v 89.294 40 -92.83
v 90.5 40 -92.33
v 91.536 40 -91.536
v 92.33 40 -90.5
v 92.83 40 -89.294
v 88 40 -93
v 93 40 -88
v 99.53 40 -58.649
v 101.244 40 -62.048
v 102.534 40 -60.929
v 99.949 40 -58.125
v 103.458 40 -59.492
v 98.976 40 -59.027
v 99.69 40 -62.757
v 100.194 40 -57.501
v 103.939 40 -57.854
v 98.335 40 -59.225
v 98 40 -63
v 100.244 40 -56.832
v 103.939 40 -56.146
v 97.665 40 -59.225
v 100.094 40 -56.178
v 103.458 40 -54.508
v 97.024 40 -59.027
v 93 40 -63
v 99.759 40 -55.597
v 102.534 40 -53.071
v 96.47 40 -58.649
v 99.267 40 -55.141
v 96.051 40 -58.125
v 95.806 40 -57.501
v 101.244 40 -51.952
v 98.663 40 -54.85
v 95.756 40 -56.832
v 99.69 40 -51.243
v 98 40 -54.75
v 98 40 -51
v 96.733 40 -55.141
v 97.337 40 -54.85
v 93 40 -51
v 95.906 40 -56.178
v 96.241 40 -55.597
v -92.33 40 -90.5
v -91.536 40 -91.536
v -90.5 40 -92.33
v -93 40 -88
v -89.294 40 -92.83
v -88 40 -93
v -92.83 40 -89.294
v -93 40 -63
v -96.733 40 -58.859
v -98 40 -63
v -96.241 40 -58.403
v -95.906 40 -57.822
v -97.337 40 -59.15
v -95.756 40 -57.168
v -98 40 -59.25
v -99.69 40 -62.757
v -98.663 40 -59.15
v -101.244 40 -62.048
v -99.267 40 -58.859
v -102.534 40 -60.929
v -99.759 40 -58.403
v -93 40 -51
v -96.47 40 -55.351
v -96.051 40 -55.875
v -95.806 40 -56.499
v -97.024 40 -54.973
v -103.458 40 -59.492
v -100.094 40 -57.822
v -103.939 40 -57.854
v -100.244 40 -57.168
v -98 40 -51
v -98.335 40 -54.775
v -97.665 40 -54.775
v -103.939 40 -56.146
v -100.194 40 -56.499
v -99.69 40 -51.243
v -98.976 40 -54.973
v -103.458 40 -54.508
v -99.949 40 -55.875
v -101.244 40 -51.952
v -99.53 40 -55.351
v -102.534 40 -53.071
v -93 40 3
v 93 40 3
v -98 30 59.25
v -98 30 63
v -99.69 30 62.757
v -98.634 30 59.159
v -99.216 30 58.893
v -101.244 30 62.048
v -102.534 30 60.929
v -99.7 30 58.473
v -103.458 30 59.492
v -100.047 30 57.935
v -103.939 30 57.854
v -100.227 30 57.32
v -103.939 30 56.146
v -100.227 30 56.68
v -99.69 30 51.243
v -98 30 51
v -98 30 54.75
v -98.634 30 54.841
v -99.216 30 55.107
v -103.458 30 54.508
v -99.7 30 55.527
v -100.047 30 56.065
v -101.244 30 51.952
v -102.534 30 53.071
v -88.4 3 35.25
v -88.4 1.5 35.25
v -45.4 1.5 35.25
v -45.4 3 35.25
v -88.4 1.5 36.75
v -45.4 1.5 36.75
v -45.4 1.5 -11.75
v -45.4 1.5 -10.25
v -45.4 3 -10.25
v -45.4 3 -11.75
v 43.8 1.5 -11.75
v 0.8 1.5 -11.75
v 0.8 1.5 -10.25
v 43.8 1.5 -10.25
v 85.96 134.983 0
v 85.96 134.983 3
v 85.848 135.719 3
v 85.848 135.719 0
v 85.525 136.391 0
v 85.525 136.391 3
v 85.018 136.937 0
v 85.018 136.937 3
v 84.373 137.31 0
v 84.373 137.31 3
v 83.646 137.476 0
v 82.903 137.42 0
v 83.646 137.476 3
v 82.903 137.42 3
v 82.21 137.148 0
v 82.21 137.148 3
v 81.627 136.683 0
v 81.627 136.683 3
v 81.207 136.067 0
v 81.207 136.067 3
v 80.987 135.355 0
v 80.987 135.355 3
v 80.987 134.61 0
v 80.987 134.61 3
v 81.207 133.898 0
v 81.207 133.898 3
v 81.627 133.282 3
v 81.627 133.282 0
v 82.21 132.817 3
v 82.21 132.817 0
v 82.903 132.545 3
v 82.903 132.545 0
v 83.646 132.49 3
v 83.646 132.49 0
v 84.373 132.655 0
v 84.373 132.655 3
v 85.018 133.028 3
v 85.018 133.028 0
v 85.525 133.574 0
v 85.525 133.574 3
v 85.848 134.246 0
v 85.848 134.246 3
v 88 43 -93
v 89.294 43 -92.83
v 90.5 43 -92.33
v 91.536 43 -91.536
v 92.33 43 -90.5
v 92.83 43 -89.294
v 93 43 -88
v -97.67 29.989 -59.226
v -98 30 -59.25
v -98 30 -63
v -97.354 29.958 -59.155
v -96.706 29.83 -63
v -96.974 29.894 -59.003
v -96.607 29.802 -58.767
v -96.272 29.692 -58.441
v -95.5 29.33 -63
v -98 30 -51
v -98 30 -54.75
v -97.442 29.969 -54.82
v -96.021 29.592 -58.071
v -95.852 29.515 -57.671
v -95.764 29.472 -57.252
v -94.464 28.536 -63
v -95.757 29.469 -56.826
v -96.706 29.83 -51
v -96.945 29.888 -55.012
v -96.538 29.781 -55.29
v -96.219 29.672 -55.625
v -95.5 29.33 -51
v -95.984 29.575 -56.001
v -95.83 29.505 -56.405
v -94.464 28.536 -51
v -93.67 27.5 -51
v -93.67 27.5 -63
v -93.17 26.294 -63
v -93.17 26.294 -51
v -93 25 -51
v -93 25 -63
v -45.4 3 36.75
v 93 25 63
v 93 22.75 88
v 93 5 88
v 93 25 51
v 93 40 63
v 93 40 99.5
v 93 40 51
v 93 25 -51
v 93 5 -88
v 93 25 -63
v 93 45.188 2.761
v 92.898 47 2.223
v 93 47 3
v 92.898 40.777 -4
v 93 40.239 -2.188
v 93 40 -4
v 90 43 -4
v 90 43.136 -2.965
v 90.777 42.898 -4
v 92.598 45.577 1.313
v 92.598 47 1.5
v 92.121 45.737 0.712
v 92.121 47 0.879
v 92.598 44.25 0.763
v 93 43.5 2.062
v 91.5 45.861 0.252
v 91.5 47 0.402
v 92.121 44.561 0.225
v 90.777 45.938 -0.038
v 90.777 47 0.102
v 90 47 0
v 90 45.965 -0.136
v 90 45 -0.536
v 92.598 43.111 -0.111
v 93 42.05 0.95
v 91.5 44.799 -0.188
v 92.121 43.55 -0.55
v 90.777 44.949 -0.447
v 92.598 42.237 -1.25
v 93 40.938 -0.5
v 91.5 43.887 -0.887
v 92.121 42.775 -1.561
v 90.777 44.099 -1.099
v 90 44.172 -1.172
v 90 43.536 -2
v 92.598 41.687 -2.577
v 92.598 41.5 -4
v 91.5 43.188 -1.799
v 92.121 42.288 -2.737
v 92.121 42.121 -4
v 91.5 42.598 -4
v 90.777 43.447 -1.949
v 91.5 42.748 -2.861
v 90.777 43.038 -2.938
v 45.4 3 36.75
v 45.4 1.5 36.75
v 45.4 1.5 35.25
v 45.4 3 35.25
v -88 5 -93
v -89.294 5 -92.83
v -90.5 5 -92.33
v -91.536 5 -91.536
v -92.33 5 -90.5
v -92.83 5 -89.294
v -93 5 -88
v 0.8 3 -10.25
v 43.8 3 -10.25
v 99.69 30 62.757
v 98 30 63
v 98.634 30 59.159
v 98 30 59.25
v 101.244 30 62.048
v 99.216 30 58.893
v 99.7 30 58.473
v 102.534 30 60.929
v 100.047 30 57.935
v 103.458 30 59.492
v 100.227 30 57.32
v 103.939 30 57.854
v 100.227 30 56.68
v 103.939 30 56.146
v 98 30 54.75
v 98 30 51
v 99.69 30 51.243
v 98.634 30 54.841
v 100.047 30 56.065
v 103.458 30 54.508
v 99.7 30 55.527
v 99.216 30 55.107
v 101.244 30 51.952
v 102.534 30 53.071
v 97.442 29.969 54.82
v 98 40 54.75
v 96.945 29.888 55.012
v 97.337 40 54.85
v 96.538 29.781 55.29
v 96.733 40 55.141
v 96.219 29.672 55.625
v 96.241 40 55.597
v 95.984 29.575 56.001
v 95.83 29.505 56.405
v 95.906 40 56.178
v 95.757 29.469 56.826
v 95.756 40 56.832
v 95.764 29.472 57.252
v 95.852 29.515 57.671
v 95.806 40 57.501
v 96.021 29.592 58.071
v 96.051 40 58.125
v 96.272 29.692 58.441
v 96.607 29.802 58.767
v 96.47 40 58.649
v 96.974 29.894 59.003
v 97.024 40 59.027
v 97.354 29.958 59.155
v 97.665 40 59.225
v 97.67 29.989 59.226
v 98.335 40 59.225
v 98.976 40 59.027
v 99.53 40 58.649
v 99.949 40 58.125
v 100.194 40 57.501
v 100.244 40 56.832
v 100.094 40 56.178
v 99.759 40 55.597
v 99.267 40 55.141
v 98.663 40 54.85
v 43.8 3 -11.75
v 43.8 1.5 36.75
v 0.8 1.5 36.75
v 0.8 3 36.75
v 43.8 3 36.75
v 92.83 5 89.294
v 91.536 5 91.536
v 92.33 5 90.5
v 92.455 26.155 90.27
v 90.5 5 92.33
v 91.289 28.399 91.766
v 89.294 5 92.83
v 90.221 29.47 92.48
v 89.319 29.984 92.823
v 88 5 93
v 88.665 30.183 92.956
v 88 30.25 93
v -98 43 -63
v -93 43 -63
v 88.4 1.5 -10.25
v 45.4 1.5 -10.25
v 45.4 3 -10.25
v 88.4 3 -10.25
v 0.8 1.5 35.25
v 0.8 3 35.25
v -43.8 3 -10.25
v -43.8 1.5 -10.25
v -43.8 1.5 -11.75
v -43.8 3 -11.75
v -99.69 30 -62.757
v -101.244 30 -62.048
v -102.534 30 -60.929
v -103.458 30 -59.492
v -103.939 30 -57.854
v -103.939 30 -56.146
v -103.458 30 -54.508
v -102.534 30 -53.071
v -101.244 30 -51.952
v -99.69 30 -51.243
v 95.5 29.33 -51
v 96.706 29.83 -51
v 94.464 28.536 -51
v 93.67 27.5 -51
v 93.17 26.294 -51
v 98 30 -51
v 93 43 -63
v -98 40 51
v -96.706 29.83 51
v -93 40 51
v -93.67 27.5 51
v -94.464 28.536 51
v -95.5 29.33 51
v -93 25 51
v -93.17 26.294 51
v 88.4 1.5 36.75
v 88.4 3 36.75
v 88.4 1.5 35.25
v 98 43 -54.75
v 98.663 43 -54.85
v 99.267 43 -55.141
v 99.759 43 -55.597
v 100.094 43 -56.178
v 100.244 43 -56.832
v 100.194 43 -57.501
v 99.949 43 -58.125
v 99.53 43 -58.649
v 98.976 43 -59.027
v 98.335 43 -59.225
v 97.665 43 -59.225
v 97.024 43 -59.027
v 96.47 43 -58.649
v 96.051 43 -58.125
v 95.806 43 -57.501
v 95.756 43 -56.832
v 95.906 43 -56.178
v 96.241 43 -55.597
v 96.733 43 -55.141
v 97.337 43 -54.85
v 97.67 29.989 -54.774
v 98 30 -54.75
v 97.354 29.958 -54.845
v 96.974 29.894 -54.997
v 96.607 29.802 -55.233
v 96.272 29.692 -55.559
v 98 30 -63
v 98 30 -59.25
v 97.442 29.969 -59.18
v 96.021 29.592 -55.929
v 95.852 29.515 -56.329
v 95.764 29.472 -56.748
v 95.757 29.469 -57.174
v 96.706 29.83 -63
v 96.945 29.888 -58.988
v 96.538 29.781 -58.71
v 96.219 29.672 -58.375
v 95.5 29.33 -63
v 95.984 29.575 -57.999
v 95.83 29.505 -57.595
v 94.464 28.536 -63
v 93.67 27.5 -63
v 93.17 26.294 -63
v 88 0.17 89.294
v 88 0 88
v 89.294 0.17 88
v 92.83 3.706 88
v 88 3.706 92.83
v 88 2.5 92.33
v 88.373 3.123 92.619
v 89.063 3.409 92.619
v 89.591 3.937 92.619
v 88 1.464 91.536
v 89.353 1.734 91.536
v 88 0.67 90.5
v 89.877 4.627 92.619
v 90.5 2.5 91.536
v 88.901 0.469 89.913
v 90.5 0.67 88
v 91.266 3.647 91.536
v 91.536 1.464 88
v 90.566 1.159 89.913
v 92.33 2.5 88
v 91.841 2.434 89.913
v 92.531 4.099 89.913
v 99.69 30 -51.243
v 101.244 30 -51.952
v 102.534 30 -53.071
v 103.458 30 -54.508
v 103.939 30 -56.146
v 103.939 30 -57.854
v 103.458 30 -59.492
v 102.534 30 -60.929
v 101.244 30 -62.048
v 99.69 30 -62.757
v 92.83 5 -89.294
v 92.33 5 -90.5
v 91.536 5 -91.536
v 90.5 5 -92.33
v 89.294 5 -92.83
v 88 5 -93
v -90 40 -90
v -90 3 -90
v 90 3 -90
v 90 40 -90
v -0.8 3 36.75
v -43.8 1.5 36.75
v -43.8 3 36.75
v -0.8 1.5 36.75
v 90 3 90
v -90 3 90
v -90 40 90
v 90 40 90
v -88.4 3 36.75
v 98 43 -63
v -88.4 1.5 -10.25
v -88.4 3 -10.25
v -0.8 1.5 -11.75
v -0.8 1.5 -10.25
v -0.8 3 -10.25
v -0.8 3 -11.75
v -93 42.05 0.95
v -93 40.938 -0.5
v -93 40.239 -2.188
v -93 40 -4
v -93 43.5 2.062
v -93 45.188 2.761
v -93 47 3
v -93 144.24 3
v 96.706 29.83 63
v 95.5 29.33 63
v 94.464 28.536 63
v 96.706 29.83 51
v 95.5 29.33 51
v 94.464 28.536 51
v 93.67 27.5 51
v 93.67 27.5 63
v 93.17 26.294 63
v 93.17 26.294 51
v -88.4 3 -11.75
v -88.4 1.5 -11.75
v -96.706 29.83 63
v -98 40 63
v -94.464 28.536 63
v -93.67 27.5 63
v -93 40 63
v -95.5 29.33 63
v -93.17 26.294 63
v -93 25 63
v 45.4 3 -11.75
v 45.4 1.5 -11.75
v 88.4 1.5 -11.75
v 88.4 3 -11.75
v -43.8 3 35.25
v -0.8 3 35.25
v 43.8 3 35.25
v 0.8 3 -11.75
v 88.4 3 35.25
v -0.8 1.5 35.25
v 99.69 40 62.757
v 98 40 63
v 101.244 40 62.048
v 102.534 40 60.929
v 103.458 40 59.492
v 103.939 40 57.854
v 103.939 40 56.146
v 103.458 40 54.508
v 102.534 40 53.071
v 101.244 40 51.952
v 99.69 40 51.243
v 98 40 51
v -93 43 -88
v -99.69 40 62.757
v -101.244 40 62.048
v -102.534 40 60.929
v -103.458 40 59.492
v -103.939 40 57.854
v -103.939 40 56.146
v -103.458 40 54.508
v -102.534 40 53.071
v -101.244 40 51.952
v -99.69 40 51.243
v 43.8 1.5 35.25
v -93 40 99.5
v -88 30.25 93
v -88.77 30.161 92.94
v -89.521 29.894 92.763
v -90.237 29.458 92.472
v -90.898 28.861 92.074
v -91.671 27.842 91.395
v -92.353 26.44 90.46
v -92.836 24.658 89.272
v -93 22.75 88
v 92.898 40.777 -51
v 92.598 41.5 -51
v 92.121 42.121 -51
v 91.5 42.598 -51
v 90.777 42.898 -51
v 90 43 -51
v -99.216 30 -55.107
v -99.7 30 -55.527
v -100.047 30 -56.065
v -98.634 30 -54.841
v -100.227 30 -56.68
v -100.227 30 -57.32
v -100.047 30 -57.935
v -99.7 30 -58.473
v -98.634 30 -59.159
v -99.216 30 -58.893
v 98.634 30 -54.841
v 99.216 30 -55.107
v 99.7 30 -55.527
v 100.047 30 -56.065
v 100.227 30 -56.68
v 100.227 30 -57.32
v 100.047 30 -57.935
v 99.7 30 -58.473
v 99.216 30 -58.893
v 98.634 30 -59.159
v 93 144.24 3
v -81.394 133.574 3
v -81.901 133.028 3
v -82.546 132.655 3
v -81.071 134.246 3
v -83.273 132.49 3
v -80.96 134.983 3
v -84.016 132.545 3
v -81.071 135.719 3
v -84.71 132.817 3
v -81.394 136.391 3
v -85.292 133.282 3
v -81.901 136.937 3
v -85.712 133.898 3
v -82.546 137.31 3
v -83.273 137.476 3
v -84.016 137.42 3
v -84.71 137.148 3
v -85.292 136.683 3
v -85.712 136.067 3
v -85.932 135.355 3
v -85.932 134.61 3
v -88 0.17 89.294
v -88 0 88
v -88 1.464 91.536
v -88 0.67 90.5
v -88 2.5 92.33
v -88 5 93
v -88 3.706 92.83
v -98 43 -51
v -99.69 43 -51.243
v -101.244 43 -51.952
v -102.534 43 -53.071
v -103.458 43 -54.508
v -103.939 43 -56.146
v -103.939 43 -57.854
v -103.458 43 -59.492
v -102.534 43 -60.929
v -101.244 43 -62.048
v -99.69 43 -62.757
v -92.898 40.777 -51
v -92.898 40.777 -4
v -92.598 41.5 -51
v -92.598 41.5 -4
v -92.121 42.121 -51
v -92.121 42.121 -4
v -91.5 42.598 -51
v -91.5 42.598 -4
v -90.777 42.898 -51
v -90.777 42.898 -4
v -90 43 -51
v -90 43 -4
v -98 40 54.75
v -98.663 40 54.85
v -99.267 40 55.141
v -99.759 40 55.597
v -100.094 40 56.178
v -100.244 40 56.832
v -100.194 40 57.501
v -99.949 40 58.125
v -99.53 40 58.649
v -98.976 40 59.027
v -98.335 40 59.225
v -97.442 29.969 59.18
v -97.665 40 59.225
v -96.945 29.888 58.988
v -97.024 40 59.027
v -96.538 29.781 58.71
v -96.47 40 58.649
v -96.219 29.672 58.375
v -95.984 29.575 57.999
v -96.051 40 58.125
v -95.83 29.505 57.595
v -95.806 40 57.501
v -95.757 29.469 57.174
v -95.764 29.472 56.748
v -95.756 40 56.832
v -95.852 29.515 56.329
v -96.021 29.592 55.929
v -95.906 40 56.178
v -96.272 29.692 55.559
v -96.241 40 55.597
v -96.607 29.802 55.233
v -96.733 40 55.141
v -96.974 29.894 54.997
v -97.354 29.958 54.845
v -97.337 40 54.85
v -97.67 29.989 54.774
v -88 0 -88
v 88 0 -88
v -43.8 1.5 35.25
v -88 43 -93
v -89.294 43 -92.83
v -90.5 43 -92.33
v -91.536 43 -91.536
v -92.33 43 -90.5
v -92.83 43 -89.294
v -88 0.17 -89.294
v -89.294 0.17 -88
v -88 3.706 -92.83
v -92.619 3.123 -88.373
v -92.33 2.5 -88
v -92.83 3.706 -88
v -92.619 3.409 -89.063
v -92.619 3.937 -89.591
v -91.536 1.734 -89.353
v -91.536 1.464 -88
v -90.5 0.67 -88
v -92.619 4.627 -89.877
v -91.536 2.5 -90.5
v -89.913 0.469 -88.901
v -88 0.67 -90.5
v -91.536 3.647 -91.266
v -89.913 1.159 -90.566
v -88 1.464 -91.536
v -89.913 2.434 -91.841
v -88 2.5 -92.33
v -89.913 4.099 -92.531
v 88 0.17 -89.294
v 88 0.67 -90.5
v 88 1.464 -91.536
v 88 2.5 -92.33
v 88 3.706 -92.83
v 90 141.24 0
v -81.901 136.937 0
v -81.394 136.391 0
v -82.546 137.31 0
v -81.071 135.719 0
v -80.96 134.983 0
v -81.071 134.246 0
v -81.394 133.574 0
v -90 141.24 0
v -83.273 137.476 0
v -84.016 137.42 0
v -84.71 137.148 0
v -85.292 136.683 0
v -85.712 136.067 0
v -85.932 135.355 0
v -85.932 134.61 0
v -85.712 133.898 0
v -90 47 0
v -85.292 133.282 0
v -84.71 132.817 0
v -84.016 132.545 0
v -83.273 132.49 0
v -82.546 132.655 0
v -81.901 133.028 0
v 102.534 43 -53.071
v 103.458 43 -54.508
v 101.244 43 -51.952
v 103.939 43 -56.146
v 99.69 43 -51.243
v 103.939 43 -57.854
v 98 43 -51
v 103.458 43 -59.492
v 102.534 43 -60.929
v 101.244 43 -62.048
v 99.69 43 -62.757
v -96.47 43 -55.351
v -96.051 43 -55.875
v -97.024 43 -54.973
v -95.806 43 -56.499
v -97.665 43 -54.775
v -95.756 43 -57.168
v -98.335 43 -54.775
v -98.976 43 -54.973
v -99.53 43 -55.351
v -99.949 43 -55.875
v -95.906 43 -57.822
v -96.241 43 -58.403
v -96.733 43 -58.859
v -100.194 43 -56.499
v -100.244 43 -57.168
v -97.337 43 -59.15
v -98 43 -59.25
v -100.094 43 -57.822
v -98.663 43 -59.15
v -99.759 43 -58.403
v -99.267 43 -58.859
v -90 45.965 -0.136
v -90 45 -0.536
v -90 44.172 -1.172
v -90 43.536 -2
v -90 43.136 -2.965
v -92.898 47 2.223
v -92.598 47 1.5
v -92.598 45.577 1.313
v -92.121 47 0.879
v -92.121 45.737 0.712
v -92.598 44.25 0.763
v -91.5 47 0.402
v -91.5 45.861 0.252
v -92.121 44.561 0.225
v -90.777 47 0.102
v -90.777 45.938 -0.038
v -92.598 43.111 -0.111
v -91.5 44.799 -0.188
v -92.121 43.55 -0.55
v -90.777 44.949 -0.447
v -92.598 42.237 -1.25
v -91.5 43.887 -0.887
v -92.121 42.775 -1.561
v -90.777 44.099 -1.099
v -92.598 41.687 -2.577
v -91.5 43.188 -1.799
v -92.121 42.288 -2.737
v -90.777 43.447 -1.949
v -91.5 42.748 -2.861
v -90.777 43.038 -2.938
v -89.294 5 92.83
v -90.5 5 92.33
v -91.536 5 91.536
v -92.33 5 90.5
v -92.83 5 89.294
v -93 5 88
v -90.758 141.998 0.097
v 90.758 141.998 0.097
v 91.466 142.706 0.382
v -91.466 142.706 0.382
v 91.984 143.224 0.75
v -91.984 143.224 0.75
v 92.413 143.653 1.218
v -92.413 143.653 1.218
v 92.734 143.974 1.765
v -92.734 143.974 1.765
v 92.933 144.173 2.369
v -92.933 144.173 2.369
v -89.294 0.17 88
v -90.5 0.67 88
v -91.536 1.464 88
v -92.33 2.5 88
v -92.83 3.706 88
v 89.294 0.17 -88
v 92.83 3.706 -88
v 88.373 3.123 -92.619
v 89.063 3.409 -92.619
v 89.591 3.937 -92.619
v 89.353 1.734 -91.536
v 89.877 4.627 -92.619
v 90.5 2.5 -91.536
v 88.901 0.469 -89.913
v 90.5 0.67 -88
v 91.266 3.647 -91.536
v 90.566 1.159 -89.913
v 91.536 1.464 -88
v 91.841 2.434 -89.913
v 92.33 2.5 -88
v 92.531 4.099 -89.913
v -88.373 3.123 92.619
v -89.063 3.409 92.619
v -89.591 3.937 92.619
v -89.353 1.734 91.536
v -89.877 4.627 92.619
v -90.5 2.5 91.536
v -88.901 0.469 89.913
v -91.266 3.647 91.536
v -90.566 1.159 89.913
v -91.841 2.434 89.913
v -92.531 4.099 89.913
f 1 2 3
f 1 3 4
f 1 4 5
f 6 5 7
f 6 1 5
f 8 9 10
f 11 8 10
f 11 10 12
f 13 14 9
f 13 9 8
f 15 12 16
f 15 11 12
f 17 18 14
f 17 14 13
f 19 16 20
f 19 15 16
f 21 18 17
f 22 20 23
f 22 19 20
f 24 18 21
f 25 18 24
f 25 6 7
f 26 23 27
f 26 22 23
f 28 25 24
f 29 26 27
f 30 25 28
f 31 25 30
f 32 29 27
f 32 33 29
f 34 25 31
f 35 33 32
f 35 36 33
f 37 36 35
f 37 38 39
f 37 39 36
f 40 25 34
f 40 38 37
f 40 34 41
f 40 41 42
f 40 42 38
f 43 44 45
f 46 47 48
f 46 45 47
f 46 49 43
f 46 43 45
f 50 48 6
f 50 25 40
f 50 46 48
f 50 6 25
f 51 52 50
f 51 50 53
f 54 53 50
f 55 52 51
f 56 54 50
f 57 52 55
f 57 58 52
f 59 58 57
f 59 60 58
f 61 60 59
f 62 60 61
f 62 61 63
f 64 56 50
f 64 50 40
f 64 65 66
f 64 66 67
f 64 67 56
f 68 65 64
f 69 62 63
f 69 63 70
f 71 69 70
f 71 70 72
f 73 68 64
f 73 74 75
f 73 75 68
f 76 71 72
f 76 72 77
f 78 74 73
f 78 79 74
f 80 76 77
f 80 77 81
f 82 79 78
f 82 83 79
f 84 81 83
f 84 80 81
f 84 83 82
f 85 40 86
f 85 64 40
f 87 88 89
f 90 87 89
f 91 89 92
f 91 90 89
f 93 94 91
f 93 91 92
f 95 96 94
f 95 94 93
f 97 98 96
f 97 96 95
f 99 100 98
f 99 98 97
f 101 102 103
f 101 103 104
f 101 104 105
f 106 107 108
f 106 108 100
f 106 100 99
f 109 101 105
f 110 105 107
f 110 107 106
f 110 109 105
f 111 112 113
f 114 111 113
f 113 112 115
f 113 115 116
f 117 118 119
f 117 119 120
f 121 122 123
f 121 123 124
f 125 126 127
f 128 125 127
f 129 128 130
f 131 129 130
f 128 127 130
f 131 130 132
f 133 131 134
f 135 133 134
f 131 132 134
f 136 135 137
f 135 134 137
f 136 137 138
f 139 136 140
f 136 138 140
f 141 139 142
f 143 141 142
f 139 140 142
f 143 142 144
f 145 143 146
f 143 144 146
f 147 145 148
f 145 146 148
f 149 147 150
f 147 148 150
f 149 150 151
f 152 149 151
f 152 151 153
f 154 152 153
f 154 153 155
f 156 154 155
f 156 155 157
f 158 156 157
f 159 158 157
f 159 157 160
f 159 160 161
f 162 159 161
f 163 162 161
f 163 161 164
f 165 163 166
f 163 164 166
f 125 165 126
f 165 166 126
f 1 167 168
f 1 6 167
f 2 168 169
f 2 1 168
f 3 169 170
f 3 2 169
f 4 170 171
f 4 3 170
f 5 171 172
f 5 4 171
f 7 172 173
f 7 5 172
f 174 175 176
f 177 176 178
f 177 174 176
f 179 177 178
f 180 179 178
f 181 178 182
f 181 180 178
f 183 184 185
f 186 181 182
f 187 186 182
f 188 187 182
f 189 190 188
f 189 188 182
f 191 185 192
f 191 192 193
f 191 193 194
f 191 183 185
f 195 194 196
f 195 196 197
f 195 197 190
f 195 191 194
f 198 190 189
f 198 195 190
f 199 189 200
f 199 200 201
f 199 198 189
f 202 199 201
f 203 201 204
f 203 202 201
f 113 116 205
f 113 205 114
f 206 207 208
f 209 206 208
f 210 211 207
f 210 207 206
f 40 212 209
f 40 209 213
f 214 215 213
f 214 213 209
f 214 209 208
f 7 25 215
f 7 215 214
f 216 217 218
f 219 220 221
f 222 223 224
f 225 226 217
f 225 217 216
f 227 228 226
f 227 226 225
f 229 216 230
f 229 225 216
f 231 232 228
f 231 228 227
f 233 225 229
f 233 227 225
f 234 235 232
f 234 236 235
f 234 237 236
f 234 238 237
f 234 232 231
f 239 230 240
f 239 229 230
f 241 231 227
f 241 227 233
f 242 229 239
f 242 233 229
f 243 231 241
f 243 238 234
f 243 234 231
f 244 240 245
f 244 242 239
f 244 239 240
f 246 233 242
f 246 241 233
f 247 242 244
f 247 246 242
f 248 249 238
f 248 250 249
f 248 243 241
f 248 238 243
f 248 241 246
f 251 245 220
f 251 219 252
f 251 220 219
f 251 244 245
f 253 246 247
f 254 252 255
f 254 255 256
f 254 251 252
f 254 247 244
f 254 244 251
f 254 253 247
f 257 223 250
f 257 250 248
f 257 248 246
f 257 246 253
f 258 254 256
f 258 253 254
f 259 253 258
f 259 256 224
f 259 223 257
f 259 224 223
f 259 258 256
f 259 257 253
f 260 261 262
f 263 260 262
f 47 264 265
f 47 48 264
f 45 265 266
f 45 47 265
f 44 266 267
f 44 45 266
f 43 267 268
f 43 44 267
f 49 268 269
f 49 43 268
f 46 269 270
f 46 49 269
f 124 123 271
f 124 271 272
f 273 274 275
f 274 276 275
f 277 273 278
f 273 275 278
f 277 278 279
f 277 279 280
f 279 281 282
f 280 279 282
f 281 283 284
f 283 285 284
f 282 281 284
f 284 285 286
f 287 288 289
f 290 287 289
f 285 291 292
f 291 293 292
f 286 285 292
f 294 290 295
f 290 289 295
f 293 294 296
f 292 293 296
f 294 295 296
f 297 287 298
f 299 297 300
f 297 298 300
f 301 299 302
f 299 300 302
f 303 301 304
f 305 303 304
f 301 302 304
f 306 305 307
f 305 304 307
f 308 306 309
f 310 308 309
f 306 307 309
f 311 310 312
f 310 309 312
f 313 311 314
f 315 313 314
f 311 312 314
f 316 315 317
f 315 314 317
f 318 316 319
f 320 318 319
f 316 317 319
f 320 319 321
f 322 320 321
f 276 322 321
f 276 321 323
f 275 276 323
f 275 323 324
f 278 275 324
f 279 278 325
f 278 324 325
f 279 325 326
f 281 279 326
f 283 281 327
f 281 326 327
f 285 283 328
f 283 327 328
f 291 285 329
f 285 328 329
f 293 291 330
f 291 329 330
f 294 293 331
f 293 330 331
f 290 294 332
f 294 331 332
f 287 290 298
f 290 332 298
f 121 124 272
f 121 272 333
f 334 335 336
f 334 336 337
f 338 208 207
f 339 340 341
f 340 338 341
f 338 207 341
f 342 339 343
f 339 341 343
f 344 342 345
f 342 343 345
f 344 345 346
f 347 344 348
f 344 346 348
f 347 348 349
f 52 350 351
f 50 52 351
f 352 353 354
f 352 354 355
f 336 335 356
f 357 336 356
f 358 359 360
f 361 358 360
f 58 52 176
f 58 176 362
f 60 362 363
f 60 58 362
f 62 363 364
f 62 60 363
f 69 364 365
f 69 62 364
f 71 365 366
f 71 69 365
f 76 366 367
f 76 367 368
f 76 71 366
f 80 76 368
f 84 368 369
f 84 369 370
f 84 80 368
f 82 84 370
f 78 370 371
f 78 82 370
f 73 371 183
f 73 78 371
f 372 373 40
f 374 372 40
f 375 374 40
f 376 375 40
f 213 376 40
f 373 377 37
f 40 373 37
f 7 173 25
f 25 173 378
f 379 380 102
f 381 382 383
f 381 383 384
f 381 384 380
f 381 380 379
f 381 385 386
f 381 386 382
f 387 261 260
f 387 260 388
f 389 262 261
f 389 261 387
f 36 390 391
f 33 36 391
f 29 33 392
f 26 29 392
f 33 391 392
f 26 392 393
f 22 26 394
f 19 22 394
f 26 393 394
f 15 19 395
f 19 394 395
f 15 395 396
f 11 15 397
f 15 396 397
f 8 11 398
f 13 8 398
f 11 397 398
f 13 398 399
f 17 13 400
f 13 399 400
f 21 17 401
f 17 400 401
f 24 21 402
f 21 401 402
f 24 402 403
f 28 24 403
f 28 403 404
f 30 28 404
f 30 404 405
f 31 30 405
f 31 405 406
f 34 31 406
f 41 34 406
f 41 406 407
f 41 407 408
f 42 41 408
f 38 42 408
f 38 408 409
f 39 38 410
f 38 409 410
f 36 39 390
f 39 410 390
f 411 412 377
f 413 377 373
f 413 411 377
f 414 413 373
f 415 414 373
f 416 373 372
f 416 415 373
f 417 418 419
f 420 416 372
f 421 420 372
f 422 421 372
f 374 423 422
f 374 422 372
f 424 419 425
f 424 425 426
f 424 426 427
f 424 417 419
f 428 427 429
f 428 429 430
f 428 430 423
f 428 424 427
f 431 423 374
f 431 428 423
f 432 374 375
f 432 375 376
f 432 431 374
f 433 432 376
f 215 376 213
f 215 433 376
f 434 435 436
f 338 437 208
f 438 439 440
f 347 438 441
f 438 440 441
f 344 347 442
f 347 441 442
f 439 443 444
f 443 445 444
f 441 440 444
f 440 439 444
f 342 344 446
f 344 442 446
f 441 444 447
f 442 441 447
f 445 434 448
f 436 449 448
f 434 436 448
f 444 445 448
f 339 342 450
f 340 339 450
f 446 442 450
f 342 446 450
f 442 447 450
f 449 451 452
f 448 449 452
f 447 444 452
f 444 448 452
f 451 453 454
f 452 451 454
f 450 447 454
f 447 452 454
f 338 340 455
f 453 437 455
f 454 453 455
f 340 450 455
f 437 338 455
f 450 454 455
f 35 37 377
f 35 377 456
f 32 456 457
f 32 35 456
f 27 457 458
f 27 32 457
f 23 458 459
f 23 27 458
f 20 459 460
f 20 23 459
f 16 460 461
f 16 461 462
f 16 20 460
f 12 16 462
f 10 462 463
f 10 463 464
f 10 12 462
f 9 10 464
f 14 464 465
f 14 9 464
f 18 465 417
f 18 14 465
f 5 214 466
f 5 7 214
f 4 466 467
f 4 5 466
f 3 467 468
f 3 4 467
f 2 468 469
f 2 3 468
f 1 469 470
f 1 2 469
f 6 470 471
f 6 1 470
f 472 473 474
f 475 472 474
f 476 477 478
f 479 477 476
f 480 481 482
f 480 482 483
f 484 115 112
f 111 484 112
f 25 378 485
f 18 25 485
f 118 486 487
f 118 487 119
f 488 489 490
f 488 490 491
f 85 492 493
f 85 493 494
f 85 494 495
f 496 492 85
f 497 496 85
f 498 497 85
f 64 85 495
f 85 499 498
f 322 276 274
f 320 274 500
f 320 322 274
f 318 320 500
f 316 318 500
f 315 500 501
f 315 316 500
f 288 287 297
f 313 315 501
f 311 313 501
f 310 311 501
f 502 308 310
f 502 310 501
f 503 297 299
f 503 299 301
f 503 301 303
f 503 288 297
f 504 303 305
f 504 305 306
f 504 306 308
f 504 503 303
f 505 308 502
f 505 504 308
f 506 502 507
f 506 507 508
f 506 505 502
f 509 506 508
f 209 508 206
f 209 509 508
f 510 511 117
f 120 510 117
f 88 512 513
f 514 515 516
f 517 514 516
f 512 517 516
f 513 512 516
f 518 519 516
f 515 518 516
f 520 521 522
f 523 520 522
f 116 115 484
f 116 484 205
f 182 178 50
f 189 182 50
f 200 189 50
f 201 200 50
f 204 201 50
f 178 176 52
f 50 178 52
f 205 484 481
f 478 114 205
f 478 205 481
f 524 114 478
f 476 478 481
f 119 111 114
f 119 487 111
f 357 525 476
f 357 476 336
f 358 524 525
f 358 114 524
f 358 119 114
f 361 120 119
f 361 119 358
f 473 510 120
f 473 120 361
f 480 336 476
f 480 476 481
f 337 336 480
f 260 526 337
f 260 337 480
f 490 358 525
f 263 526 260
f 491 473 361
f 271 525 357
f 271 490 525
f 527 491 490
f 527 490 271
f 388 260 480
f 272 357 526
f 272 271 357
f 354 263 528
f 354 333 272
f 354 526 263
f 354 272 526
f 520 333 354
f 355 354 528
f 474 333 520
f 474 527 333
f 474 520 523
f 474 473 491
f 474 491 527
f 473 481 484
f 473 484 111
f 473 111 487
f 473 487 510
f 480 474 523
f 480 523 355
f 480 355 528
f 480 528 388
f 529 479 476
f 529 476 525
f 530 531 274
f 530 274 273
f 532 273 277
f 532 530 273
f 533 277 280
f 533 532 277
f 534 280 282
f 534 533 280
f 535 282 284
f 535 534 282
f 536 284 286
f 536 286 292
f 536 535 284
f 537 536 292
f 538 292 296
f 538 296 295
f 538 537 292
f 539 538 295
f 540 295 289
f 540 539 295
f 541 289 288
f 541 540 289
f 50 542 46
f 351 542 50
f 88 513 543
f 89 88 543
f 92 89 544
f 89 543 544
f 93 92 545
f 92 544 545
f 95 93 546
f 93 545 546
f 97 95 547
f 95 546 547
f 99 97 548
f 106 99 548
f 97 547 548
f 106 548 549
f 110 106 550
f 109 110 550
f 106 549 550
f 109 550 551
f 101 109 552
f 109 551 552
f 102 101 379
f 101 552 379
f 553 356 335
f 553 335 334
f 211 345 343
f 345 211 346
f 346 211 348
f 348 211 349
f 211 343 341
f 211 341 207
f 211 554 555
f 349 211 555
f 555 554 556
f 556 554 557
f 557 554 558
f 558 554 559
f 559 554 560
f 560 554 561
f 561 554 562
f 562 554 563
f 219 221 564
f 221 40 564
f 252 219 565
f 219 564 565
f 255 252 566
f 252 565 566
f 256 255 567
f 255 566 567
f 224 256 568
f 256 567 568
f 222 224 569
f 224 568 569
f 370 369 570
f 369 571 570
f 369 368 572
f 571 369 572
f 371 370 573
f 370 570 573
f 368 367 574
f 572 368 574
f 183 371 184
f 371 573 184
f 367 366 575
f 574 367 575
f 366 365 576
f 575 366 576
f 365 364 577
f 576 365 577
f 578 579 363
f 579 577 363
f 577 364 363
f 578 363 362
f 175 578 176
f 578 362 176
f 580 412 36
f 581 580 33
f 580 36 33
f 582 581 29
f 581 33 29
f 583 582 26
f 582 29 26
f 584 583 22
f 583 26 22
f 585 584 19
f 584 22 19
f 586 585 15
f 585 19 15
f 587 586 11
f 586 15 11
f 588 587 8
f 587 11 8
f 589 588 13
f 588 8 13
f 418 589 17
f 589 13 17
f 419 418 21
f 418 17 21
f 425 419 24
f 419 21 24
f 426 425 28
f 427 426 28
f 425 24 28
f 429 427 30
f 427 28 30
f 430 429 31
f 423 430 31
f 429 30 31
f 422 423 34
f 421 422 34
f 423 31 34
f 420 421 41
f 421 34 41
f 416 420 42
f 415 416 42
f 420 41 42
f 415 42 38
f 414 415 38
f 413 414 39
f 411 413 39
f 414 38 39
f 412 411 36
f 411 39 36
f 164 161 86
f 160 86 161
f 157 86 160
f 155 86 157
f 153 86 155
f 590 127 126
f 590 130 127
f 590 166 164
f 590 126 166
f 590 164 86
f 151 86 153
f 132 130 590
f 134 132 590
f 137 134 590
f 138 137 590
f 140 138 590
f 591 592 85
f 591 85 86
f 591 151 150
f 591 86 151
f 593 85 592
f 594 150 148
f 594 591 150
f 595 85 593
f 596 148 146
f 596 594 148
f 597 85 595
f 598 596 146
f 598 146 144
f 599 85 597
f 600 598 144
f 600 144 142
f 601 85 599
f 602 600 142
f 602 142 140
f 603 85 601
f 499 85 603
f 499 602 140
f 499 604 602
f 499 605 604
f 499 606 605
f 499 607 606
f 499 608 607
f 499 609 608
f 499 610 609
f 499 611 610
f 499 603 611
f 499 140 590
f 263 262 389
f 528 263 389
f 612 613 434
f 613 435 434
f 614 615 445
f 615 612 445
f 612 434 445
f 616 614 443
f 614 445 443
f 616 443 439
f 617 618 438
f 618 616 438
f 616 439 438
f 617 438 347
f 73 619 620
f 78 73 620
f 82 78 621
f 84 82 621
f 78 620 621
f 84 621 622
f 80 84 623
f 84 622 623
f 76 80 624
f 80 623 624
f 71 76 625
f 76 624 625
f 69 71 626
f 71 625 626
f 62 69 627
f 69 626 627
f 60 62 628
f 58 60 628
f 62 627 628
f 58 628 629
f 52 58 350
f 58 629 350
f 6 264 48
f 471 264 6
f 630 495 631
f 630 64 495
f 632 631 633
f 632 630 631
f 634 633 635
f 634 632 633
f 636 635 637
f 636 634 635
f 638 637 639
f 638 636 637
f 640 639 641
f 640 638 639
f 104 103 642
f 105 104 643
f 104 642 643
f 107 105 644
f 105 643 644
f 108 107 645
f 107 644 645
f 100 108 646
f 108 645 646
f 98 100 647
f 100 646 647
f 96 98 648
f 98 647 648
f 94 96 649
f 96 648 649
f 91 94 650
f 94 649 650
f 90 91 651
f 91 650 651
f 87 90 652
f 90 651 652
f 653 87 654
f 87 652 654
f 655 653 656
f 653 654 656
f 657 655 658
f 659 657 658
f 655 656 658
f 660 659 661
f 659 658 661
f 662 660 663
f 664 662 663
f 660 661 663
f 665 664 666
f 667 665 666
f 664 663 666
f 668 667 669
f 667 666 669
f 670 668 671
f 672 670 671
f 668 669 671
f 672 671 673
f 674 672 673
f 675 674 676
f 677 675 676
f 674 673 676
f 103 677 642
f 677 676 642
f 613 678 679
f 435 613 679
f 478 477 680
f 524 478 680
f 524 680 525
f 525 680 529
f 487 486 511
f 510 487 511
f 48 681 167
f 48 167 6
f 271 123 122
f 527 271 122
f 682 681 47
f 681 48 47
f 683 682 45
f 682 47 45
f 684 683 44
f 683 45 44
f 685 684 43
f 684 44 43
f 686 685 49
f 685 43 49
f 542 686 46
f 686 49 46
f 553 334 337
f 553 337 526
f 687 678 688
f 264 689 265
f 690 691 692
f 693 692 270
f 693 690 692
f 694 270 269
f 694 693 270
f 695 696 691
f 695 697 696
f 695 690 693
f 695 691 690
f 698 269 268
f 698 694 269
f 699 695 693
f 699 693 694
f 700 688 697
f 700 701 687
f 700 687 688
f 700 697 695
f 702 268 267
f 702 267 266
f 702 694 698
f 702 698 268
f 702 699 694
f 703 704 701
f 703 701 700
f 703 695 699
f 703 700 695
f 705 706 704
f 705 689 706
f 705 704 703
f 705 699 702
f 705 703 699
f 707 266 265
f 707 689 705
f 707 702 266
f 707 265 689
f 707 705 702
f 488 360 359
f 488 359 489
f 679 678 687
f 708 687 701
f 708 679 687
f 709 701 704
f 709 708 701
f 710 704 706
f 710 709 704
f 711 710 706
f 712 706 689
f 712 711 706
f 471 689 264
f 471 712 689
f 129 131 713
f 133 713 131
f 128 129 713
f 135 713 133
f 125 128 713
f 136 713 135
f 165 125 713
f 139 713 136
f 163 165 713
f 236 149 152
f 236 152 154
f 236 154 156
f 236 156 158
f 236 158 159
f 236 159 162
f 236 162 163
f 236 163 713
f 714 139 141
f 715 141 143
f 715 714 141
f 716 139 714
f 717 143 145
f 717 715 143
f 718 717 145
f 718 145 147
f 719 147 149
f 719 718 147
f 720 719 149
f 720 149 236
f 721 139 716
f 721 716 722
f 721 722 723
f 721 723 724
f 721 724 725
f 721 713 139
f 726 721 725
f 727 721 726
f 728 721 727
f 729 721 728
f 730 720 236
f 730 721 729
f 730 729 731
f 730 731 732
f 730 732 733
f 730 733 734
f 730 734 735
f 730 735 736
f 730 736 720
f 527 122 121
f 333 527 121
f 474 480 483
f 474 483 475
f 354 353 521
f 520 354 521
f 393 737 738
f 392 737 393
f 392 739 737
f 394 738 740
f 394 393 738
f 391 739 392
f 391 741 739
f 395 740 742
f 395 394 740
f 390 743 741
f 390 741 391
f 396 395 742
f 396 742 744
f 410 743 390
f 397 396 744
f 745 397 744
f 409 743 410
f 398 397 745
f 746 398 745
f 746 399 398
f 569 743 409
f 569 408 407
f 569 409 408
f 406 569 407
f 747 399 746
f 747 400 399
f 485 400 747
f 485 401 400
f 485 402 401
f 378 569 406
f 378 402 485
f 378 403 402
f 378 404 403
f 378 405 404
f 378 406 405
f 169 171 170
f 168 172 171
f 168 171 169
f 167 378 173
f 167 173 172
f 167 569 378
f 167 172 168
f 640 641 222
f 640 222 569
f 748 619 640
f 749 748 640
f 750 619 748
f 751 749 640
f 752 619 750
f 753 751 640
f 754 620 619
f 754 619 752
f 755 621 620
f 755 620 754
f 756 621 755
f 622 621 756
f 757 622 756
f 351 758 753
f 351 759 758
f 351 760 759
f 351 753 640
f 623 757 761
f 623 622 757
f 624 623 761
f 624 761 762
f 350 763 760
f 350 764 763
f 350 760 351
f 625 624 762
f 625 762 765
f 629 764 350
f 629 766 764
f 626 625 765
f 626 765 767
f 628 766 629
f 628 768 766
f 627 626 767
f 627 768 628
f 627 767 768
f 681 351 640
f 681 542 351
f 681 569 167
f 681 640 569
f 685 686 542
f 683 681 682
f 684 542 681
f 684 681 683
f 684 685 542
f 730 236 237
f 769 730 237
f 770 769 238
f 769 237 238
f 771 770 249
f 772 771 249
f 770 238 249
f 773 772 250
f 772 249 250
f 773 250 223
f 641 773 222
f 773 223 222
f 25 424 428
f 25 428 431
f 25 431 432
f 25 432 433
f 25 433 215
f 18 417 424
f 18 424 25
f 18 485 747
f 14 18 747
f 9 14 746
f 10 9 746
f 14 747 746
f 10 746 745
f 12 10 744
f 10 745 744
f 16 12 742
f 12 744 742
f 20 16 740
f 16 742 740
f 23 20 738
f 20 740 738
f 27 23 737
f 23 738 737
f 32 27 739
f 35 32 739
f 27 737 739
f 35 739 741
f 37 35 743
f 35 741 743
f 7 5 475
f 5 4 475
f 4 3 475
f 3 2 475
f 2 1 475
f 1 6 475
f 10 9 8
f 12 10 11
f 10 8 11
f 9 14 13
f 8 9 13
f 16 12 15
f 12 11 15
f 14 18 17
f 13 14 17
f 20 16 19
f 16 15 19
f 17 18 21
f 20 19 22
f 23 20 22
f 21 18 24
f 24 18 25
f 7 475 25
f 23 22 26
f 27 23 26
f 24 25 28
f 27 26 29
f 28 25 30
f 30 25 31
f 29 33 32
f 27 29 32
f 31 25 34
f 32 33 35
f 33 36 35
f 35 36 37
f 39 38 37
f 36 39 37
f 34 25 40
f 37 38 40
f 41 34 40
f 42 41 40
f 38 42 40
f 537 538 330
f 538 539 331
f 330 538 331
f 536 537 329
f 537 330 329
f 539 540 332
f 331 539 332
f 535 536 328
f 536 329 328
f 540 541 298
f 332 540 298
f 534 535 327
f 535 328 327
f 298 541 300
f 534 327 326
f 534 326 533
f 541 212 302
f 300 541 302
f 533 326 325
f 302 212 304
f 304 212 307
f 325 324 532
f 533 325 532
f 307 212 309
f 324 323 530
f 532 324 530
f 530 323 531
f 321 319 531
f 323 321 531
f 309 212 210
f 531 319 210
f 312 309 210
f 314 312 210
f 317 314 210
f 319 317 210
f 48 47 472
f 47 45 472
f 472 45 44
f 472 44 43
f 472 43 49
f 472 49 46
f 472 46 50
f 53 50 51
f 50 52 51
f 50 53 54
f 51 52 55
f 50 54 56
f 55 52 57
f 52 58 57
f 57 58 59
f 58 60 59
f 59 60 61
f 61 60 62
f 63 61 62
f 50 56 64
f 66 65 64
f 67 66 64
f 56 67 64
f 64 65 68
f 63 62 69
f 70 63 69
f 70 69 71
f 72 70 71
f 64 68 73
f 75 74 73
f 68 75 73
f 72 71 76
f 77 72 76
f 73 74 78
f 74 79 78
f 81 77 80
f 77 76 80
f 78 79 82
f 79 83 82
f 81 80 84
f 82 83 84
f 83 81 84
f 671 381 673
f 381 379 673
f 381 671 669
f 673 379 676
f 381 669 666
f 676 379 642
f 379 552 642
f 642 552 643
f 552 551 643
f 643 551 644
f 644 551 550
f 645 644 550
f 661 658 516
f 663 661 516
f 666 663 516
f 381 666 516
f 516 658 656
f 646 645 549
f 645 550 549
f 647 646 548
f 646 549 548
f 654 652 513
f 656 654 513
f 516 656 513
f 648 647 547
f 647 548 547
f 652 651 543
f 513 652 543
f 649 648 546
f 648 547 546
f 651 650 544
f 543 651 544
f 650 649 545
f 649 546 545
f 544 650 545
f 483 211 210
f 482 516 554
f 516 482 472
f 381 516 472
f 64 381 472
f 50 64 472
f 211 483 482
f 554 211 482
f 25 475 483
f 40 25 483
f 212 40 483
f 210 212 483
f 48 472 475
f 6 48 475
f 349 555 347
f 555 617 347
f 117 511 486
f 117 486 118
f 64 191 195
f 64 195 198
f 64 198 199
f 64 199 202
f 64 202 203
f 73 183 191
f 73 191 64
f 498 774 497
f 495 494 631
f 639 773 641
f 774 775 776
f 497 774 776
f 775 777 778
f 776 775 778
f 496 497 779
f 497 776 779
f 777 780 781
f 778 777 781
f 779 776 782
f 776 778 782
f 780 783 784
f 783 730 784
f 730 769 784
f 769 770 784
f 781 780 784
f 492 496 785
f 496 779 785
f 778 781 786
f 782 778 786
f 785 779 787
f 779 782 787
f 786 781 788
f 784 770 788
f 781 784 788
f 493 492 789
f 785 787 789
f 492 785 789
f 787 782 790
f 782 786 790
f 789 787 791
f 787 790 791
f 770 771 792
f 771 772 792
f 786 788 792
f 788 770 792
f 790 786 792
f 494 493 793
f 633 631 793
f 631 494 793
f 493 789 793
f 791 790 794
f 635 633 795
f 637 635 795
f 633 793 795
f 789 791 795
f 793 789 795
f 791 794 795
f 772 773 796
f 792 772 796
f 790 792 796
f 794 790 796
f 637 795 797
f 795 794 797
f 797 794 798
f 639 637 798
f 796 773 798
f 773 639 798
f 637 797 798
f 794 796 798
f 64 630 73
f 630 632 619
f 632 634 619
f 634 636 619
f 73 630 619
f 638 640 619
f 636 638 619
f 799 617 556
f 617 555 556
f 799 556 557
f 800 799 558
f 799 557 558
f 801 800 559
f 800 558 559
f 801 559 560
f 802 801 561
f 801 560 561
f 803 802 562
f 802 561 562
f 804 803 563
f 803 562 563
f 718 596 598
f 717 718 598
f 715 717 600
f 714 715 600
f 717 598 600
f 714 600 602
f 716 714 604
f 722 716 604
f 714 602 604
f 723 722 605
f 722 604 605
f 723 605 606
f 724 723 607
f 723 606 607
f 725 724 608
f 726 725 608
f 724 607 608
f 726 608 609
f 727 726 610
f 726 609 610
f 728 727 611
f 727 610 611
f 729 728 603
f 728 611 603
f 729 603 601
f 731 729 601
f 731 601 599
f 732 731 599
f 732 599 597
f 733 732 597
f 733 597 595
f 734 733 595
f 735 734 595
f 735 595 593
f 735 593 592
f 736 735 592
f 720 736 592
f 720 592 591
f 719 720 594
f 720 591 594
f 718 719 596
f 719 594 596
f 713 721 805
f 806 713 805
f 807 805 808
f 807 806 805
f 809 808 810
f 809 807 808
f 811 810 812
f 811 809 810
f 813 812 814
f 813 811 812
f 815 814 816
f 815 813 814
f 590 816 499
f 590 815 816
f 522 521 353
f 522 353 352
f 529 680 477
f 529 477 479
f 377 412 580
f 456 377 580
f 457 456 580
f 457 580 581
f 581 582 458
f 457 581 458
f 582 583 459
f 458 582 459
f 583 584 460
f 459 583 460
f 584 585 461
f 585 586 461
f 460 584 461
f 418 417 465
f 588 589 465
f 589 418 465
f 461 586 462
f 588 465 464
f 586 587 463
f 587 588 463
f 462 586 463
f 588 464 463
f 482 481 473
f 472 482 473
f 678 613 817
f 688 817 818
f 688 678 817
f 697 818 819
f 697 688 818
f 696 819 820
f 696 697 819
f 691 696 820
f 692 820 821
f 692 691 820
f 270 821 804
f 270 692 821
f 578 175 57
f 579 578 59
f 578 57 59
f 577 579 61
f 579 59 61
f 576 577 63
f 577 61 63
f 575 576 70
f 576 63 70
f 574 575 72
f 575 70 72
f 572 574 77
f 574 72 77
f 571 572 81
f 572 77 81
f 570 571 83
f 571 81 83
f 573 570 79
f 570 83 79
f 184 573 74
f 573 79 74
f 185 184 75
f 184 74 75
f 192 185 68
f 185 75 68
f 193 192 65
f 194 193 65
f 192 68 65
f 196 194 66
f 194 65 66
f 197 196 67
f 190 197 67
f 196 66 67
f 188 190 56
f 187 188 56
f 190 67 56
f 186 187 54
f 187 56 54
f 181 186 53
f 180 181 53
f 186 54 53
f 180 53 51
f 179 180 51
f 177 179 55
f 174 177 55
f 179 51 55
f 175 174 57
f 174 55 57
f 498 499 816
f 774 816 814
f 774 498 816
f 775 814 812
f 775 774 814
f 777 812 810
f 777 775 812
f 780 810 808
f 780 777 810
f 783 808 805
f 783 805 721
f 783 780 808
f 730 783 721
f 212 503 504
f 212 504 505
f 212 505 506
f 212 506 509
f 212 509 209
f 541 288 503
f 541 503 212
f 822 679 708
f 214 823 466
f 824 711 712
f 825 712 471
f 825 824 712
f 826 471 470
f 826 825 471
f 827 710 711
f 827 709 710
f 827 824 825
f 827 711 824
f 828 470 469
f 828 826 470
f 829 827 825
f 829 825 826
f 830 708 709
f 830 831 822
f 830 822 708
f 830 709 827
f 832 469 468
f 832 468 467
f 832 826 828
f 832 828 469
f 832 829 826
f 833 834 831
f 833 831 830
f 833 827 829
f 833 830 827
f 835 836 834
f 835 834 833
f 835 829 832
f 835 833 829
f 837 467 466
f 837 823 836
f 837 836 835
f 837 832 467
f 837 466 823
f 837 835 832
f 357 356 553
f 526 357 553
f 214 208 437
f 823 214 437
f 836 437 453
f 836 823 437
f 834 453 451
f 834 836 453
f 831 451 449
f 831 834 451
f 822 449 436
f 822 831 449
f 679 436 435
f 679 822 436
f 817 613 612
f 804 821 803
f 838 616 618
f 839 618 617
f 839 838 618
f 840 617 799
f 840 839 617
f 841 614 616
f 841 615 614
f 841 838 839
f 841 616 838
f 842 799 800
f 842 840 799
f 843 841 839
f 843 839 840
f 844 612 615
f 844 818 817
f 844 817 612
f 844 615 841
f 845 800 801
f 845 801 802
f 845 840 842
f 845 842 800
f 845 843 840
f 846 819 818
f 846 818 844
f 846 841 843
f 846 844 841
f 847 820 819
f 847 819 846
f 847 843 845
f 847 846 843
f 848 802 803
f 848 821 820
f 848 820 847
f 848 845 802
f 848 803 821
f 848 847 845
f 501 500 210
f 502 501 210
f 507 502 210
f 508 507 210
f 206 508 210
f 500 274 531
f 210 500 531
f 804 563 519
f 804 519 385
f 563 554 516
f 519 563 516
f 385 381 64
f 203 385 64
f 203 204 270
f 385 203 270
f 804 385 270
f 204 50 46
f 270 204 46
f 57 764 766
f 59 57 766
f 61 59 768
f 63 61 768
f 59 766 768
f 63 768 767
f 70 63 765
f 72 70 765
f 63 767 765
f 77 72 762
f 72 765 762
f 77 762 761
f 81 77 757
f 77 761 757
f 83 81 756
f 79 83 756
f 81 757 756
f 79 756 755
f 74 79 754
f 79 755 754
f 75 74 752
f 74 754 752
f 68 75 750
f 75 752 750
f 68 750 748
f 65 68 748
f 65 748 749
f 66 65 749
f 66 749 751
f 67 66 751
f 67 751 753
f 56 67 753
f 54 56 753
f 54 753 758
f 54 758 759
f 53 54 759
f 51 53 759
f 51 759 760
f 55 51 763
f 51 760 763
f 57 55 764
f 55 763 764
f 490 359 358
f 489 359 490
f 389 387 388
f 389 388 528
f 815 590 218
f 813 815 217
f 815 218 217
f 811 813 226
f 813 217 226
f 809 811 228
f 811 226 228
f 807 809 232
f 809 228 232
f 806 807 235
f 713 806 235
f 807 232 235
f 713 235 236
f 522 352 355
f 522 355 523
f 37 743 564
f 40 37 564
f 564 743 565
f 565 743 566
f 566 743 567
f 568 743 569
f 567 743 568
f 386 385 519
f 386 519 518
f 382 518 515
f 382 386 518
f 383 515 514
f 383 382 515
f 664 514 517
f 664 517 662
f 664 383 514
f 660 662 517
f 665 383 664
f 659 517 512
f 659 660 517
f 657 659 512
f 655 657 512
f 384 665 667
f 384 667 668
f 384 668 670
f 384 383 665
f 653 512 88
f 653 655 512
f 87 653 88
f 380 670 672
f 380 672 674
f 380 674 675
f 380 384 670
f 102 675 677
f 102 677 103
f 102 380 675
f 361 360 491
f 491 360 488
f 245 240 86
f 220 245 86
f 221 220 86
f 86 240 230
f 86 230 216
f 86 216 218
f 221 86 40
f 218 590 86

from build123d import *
from OCP.BRepFilletAPI import BRepFilletAPI_MakeFillet

# Parameters (mm, degrees)
SKETCH2_W                = 180
SKETCH2_H                = 180
SKETCH2_W_2              = 43
SKETCH2_H_2              = 1.5
BOSS_EXTRUDE1_DEPTH      = 3
SKETCH2_5_W              = 43
SKETCH2_5_H              = 1.5
BOSS_EXTRUDE2_DEPTH      = 1.5
SKETCH3_W                = 186
SKETCH3_H                = 186
SKETCH3_W_2              = 180
SKETCH3_H_2              = 180
BOSS_EXTRUDE3_DEPTH      = 40
BOSS_EXTRUDE5_DEPTH      = 93
BOSS_EXTRUDE5_DEPTH_BACK = 93
BOSS_EXTRUDE6_DEPTH      = 93
BOSS_EXTRUDE6_DEPTH_BACK = 93
FILLET1_R                = 5
FILLET3_R1               = 5
FILLET3_R2               = 4
SKETCH7_R                = 2.5
CUT_EXTRUDE1_DEPTH       = 3
SKETCH8_R                = 2.25
BOSS_EXTRUDE7_DEPTH      = 3
SKETCH9_R                = 2.25
BOSS_EXTRUDE8_DEPTH      = 10
FILLET4_R                = 5
FILLET5_R                = 3


# Some blends are built 0.0001 mm under size
with BuildPart() as part:
    # Sketch2 → Boss-Extrude1 (new body)
    with BuildSketch(Plane(origin=(0, 0, 0), x_dir=(1, 0, 0), z_dir=(0, 1, 0))):
        Rectangle(SKETCH2_W, SKETCH2_H)
        with Locations((-66.9, 11)):
            Rectangle(SKETCH2_W_2, SKETCH2_H_2, mode=Mode.SUBTRACT)
        with Locations((-22.3, 11)):
            Rectangle(SKETCH2_W_2, SKETCH2_H_2, mode=Mode.SUBTRACT)
        with Locations((66.9, 11)):
            Rectangle(SKETCH2_W_2, SKETCH2_H_2, mode=Mode.SUBTRACT)
        with Locations((22.3, 11)):
            Rectangle(SKETCH2_W_2, SKETCH2_H_2, mode=Mode.SUBTRACT)
        with Locations((66.9, -36)):
            Rectangle(SKETCH2_W_2, SKETCH2_H_2, mode=Mode.SUBTRACT)
        with Locations((22.3, -36)):
            Rectangle(SKETCH2_W_2, SKETCH2_H_2, mode=Mode.SUBTRACT)
        with Locations((-22.3, -36)):
            Rectangle(SKETCH2_W_2, SKETCH2_H_2, mode=Mode.SUBTRACT)
        with Locations((-66.9, -36)):
            Rectangle(SKETCH2_W_2, SKETCH2_H_2, mode=Mode.SUBTRACT)
    extrude(amount=BOSS_EXTRUDE1_DEPTH)

    # Sketch2<5> → Boss-Extrude2 (add)
    with BuildSketch(Plane(origin=(0, 0, 0), x_dir=(1, 0, 0), z_dir=(0, 1, 0))):
        with Locations((22.3, 11)):
            Rectangle(SKETCH2_5_W, SKETCH2_5_H)
        with Locations((66.9, 11)):
            Rectangle(SKETCH2_5_W, SKETCH2_5_H)
        with Locations((-66.9, -36)):
            Rectangle(SKETCH2_5_W, SKETCH2_5_H)
        with Locations((-22.3, -36)):
            Rectangle(SKETCH2_5_W, SKETCH2_5_H)
        with Locations((66.9, -36)):
            Rectangle(SKETCH2_5_W, SKETCH2_5_H)
        with Locations((22.3, -36)):
            Rectangle(SKETCH2_5_W, SKETCH2_5_H)
        with Locations((-66.9, 11)):
            Rectangle(SKETCH2_5_W, SKETCH2_5_H)
        with Locations((-22.3, 11)):
            Rectangle(SKETCH2_5_W, SKETCH2_5_H)
    extrude(amount=BOSS_EXTRUDE2_DEPTH)

    # Sketch3 → Boss-Extrude3 (add)
    with BuildSketch(Plane(origin=(0, 0, 0), x_dir=(1, 0, 0), z_dir=(0, 1, 0))):
        Rectangle(SKETCH3_W, SKETCH3_H)
        Rectangle(SKETCH3_W_2, SKETCH3_H_2, mode=Mode.SUBTRACT)
    extrude(amount=BOSS_EXTRUDE3_DEPTH)

    # Sketch5 → Boss-Extrude5 (add, two sides: drawn at the far end of the back side and taken through both)
    with BuildSketch(Plane(origin=(0, 0, 0), x_dir=(0, 0, -1), z_dir=(1, 0, 0)).offset(-BOSS_EXTRUDE5_DEPTH_BACK)):
        Polygon((-93, 40), (-99.5, 40), (-93, 30.25), align=None)
    extrude(amount=BOSS_EXTRUDE5_DEPTH + BOSS_EXTRUDE5_DEPTH_BACK)

    # Fillet1
    fillet1_edges = [part.edges().sort_by_distance(p)[0] for p in [
        (93, 0, 0),
        (0, 0, -93),
        (93, 20, -93),
        (-93, 0, 0),
        (-93, 20, -93),
        (0, 0, 93),
        (93, 15.125, 93),
        (-93, 15.125, 93),
    ]]
    fillet(fillet1_edges, radius=FILLET1_R)

    # Sketch9 → Boss-Extrude8 (add)
    # profile 1 of 4: a face of its own
    with BuildSketch(Plane(origin=(0, 40, 0), x_dir=(1, 0, 0), z_dir=(0, 1, 0))):
        with BuildLine():
            Line((93, 51), (98, 51))
            ThreePointArc((98, 51), (104, 57), (98, 63))
            Line((98, 63), (93, 63))
            Line((93, 63), (93, 51))
        make_face()
        with Locations(Location((98, 57, 0), (0, 0, 270))):
            Circle(SKETCH9_R, mode=Mode.SUBTRACT)
    # profile 2 of 4: a face of its own
    with BuildSketch(Plane(origin=(0, 40, 0), x_dir=(1, 0, 0), z_dir=(0, 1, 0))):
        with BuildLine():
            Line((-98, 51), (-93, 51))
            Line((-93, 51), (-93, 63))
            Line((-93, 63), (-98, 63))
            ThreePointArc((-98, 63), (-104, 57), (-98, 51))
        make_face()
        with Locations(Location((-98, 57, 0), (0, 0, 90))):
            Circle(SKETCH9_R, mode=Mode.SUBTRACT)
    # profile 3 of 4: a face of its own
    with BuildSketch(Plane(origin=(0, 40, 0), x_dir=(1, 0, 0), z_dir=(0, 1, 0))):
        with BuildLine():
            Line((93, -51), (93, -63))
            Line((93, -63), (98, -63))
            ThreePointArc((98, -63), (104, -57), (98, -51))
            Line((98, -51), (93, -51))
        make_face()
        with Locations(Location((98, -57, 0), (0, 0, 90))):
            Circle(SKETCH9_R, mode=Mode.SUBTRACT)
    # profile 4 of 4: a face of its own
    with BuildSketch(Plane(origin=(0, 40, 0), x_dir=(1, 0, 0), z_dir=(0, 1, 0))):
        with BuildLine():
            Line((-93, -51), (-93, -63))
            Line((-93, -63), (-98, -63))
            ThreePointArc((-98, -63), (-104, -57), (-98, -51))
            Line((-98, -51), (-93, -51))
        make_face()
        with Locations(Location((-98, -57, 0), (0, 0, 90))):
            Circle(SKETCH9_R, mode=Mode.SUBTRACT)
    extrude(amount=-BOSS_EXTRUDE8_DEPTH)

    # Fillet4
    # the kernel refuses this fillet: 5 mm, written as the material it adds along each edge
    with BuildSketch(Plane(origin=(93, 30, -63), x_dir=(0, -1, 0), z_dir=(0, 0, 1))) as fillet4_piece_1_section:
        with BuildLine():
            CenterArc((FILLET4_R, FILLET4_R), FILLET4_R, 180, 90)
            Line((0, FILLET4_R), (0, 0))
            Line((0, 0), (FILLET4_R, 0))
        make_face()
    fillet4_piece_1 = extrude(amount=12, mode=Mode.PRIVATE)
    fillet4_piece_1 = fillet4_piece_1 - Plane(origin=(98, 28.528949062, -57), x_dir=(0, 0, 1), z_dir=(0, 1, 0)) * Cylinder(2.25, 44, mode=Mode.PRIVATE)
    add(fillet4_piece_1)
    with BuildSketch(Plane(origin=(93, 30, 51), x_dir=(0, -1, 0), z_dir=(0, 0, 1))) as fillet4_piece_2_section:
        with BuildLine():
            CenterArc((FILLET4_R, FILLET4_R), FILLET4_R, 180, 90)
            Line((0, FILLET4_R), (0, 0))
            Line((0, 0), (FILLET4_R, 0))
        make_face()
    fillet4_piece_2 = extrude(amount=12, mode=Mode.PRIVATE)
    fillet4_piece_2 = fillet4_piece_2 - Plane(origin=(98, 28.528949062, 57), x_dir=(0, 0, -1), z_dir=(0, 1, 0)) * Cylinder(2.25, 44, mode=Mode.PRIVATE)
    add(fillet4_piece_2)
    with BuildSketch(Plane(origin=(-93, 30, -51), x_dir=(0, -1, 0), z_dir=(0, 0, -1))) as fillet4_piece_3_section:
        with BuildLine():
            CenterArc((FILLET4_R, FILLET4_R), FILLET4_R, 180, 90)
            Line((0, FILLET4_R), (0, 0))
            Line((0, 0), (FILLET4_R, 0))
        make_face()
    fillet4_piece_3 = extrude(amount=12, mode=Mode.PRIVATE)
    fillet4_piece_3 = fillet4_piece_3 - Plane(origin=(-98, 28.528949062, -57), x_dir=(0, 0, -1), z_dir=(0, 1, 0)) * Cylinder(2.25, 44, mode=Mode.PRIVATE)
    add(fillet4_piece_3)
    with BuildSketch(Plane(origin=(-93, 30, 51), x_dir=(0, -1, 0), z_dir=(0, 0, 1))) as fillet4_piece_4_section:
        with BuildLine():
            CenterArc((FILLET4_R, -FILLET4_R), FILLET4_R, 90, 90)
            Line((0, -FILLET4_R), (0, 0))
            Line((0, 0), (FILLET4_R, 0))
        make_face()
    fillet4_piece_4 = extrude(amount=12, mode=Mode.PRIVATE)
    fillet4_piece_4 = fillet4_piece_4 - Plane(origin=(-98, 28.528949062, 57), x_dir=(0, 0, -1), z_dir=(0, 1, 0)) * Cylinder(2.25, 44, mode=Mode.PRIVATE)
    add(fillet4_piece_4)


with BuildPart() as body_2:
    # Sketch6 → Boss-Extrude6 (new, two sides: drawn at the far end of the back side and taken through both)
    with BuildSketch(Plane(origin=(0, 0, 0), x_dir=(0, 0, -1), z_dir=(1, 0, 0)).offset(-BOSS_EXTRUDE6_DEPTH_BACK)):
        Polygon((93, 40), (-3, 40), (-3, 144.24), (0, 144.24), (0, 43), (93, 43), align=None)
    extrude(amount=BOSS_EXTRUDE6_DEPTH + BOSS_EXTRUDE6_DEPTH_BACK)

    # Fillet3: one fillet with a radius per group of edges: ONE call of the kernel's fillet builder (fillet() takes one radius for all edges)
    fillet3_edges_1 = [body_2.edges().sort_by_distance(p)[0] for p in [
        (93, 41.5, -93),
        (-93, 41.5, -93),
    ]]
    fillet3_edges_2 = [body_2.edges().sort_by_distance(p)[0] for p in [
        (0, 43, 0),
    ]]
    fillet3 = BRepFilletAPI_MakeFillet(body_2.part.solid().wrapped)
    for e in fillet3_edges_1:
        fillet3.Add(FILLET3_R1, e.wrapped)
    for e in fillet3_edges_2:
        fillet3.Add(FILLET3_R2, e.wrapped)
    add(Compound.cast(fillet3.Shape()), mode=Mode.REPLACE)

    # Sketch7 → Cut-Extrude1 (cut)
    with BuildSketch(Plane.XY.offset(3)):
        with Locations((83.459521349, 134.98252756)):
            Circle(SKETCH7_R)
        with Locations((-83.459521349, 134.98252756)):
            Circle(SKETCH7_R)
    extrude(amount=-CUT_EXTRUDE1_DEPTH, mode=Mode.SUBTRACT)

    # Sketch8 → Boss-Extrude7 (add)
    # profile 1 of 2: a face of its own
    with BuildSketch(Plane(origin=(0, 43, 0), x_dir=(1, 0, 0), z_dir=(0, 1, 0))):
        with BuildLine():
            Line((93, 63), (98, 63))
            ThreePointArc((98, 63), (104, 57), (98, 51))
            Line((98, 51), (93, 51))
            Line((93, 51), (93, 63))
        make_face()
        with Locations(Location((98, 57, 0), (0, 0, 270))):
            Circle(SKETCH8_R, mode=Mode.SUBTRACT)
    # profile 2 of 2: a face of its own
    with BuildSketch(Plane(origin=(0, 43, 0), x_dir=(1, 0, 0), z_dir=(0, 1, 0))):
        with BuildLine():
            Line((-93, 63), (-93, 51))
            Line((-93, 51), (-98, 51))
            ThreePointArc((-98, 51), (-104, 57), (-98, 63))
            Line((-98, 63), (-93, 63))
        make_face()
        with Locations(Location((-98, 57, 0), (0, 0, 90))):
            Circle(SKETCH8_R, mode=Mode.SUBTRACT)
    extrude(amount=-BOSS_EXTRUDE7_DEPTH)

    # Fillet5
    fillet5_edges = [body_2.edges().sort_by_distance(p)[0] for p in [
        (93, 43, -27.5),
        (93, 44.171572875, -1.171572875),
        (-93, 43, -27.5),
        (-93, 44.171572875, -1.171572875),
        (93, 95.62, 0),
        (0, 144.24, 0),
        (-93, 95.62, 0),
    ]]
    fillet(fillet5_edges, radius=FILLET5_R - 0.0001)  # a hair under: the kernel refuses the full size


solid = Compound([part.part, body_2.part])
